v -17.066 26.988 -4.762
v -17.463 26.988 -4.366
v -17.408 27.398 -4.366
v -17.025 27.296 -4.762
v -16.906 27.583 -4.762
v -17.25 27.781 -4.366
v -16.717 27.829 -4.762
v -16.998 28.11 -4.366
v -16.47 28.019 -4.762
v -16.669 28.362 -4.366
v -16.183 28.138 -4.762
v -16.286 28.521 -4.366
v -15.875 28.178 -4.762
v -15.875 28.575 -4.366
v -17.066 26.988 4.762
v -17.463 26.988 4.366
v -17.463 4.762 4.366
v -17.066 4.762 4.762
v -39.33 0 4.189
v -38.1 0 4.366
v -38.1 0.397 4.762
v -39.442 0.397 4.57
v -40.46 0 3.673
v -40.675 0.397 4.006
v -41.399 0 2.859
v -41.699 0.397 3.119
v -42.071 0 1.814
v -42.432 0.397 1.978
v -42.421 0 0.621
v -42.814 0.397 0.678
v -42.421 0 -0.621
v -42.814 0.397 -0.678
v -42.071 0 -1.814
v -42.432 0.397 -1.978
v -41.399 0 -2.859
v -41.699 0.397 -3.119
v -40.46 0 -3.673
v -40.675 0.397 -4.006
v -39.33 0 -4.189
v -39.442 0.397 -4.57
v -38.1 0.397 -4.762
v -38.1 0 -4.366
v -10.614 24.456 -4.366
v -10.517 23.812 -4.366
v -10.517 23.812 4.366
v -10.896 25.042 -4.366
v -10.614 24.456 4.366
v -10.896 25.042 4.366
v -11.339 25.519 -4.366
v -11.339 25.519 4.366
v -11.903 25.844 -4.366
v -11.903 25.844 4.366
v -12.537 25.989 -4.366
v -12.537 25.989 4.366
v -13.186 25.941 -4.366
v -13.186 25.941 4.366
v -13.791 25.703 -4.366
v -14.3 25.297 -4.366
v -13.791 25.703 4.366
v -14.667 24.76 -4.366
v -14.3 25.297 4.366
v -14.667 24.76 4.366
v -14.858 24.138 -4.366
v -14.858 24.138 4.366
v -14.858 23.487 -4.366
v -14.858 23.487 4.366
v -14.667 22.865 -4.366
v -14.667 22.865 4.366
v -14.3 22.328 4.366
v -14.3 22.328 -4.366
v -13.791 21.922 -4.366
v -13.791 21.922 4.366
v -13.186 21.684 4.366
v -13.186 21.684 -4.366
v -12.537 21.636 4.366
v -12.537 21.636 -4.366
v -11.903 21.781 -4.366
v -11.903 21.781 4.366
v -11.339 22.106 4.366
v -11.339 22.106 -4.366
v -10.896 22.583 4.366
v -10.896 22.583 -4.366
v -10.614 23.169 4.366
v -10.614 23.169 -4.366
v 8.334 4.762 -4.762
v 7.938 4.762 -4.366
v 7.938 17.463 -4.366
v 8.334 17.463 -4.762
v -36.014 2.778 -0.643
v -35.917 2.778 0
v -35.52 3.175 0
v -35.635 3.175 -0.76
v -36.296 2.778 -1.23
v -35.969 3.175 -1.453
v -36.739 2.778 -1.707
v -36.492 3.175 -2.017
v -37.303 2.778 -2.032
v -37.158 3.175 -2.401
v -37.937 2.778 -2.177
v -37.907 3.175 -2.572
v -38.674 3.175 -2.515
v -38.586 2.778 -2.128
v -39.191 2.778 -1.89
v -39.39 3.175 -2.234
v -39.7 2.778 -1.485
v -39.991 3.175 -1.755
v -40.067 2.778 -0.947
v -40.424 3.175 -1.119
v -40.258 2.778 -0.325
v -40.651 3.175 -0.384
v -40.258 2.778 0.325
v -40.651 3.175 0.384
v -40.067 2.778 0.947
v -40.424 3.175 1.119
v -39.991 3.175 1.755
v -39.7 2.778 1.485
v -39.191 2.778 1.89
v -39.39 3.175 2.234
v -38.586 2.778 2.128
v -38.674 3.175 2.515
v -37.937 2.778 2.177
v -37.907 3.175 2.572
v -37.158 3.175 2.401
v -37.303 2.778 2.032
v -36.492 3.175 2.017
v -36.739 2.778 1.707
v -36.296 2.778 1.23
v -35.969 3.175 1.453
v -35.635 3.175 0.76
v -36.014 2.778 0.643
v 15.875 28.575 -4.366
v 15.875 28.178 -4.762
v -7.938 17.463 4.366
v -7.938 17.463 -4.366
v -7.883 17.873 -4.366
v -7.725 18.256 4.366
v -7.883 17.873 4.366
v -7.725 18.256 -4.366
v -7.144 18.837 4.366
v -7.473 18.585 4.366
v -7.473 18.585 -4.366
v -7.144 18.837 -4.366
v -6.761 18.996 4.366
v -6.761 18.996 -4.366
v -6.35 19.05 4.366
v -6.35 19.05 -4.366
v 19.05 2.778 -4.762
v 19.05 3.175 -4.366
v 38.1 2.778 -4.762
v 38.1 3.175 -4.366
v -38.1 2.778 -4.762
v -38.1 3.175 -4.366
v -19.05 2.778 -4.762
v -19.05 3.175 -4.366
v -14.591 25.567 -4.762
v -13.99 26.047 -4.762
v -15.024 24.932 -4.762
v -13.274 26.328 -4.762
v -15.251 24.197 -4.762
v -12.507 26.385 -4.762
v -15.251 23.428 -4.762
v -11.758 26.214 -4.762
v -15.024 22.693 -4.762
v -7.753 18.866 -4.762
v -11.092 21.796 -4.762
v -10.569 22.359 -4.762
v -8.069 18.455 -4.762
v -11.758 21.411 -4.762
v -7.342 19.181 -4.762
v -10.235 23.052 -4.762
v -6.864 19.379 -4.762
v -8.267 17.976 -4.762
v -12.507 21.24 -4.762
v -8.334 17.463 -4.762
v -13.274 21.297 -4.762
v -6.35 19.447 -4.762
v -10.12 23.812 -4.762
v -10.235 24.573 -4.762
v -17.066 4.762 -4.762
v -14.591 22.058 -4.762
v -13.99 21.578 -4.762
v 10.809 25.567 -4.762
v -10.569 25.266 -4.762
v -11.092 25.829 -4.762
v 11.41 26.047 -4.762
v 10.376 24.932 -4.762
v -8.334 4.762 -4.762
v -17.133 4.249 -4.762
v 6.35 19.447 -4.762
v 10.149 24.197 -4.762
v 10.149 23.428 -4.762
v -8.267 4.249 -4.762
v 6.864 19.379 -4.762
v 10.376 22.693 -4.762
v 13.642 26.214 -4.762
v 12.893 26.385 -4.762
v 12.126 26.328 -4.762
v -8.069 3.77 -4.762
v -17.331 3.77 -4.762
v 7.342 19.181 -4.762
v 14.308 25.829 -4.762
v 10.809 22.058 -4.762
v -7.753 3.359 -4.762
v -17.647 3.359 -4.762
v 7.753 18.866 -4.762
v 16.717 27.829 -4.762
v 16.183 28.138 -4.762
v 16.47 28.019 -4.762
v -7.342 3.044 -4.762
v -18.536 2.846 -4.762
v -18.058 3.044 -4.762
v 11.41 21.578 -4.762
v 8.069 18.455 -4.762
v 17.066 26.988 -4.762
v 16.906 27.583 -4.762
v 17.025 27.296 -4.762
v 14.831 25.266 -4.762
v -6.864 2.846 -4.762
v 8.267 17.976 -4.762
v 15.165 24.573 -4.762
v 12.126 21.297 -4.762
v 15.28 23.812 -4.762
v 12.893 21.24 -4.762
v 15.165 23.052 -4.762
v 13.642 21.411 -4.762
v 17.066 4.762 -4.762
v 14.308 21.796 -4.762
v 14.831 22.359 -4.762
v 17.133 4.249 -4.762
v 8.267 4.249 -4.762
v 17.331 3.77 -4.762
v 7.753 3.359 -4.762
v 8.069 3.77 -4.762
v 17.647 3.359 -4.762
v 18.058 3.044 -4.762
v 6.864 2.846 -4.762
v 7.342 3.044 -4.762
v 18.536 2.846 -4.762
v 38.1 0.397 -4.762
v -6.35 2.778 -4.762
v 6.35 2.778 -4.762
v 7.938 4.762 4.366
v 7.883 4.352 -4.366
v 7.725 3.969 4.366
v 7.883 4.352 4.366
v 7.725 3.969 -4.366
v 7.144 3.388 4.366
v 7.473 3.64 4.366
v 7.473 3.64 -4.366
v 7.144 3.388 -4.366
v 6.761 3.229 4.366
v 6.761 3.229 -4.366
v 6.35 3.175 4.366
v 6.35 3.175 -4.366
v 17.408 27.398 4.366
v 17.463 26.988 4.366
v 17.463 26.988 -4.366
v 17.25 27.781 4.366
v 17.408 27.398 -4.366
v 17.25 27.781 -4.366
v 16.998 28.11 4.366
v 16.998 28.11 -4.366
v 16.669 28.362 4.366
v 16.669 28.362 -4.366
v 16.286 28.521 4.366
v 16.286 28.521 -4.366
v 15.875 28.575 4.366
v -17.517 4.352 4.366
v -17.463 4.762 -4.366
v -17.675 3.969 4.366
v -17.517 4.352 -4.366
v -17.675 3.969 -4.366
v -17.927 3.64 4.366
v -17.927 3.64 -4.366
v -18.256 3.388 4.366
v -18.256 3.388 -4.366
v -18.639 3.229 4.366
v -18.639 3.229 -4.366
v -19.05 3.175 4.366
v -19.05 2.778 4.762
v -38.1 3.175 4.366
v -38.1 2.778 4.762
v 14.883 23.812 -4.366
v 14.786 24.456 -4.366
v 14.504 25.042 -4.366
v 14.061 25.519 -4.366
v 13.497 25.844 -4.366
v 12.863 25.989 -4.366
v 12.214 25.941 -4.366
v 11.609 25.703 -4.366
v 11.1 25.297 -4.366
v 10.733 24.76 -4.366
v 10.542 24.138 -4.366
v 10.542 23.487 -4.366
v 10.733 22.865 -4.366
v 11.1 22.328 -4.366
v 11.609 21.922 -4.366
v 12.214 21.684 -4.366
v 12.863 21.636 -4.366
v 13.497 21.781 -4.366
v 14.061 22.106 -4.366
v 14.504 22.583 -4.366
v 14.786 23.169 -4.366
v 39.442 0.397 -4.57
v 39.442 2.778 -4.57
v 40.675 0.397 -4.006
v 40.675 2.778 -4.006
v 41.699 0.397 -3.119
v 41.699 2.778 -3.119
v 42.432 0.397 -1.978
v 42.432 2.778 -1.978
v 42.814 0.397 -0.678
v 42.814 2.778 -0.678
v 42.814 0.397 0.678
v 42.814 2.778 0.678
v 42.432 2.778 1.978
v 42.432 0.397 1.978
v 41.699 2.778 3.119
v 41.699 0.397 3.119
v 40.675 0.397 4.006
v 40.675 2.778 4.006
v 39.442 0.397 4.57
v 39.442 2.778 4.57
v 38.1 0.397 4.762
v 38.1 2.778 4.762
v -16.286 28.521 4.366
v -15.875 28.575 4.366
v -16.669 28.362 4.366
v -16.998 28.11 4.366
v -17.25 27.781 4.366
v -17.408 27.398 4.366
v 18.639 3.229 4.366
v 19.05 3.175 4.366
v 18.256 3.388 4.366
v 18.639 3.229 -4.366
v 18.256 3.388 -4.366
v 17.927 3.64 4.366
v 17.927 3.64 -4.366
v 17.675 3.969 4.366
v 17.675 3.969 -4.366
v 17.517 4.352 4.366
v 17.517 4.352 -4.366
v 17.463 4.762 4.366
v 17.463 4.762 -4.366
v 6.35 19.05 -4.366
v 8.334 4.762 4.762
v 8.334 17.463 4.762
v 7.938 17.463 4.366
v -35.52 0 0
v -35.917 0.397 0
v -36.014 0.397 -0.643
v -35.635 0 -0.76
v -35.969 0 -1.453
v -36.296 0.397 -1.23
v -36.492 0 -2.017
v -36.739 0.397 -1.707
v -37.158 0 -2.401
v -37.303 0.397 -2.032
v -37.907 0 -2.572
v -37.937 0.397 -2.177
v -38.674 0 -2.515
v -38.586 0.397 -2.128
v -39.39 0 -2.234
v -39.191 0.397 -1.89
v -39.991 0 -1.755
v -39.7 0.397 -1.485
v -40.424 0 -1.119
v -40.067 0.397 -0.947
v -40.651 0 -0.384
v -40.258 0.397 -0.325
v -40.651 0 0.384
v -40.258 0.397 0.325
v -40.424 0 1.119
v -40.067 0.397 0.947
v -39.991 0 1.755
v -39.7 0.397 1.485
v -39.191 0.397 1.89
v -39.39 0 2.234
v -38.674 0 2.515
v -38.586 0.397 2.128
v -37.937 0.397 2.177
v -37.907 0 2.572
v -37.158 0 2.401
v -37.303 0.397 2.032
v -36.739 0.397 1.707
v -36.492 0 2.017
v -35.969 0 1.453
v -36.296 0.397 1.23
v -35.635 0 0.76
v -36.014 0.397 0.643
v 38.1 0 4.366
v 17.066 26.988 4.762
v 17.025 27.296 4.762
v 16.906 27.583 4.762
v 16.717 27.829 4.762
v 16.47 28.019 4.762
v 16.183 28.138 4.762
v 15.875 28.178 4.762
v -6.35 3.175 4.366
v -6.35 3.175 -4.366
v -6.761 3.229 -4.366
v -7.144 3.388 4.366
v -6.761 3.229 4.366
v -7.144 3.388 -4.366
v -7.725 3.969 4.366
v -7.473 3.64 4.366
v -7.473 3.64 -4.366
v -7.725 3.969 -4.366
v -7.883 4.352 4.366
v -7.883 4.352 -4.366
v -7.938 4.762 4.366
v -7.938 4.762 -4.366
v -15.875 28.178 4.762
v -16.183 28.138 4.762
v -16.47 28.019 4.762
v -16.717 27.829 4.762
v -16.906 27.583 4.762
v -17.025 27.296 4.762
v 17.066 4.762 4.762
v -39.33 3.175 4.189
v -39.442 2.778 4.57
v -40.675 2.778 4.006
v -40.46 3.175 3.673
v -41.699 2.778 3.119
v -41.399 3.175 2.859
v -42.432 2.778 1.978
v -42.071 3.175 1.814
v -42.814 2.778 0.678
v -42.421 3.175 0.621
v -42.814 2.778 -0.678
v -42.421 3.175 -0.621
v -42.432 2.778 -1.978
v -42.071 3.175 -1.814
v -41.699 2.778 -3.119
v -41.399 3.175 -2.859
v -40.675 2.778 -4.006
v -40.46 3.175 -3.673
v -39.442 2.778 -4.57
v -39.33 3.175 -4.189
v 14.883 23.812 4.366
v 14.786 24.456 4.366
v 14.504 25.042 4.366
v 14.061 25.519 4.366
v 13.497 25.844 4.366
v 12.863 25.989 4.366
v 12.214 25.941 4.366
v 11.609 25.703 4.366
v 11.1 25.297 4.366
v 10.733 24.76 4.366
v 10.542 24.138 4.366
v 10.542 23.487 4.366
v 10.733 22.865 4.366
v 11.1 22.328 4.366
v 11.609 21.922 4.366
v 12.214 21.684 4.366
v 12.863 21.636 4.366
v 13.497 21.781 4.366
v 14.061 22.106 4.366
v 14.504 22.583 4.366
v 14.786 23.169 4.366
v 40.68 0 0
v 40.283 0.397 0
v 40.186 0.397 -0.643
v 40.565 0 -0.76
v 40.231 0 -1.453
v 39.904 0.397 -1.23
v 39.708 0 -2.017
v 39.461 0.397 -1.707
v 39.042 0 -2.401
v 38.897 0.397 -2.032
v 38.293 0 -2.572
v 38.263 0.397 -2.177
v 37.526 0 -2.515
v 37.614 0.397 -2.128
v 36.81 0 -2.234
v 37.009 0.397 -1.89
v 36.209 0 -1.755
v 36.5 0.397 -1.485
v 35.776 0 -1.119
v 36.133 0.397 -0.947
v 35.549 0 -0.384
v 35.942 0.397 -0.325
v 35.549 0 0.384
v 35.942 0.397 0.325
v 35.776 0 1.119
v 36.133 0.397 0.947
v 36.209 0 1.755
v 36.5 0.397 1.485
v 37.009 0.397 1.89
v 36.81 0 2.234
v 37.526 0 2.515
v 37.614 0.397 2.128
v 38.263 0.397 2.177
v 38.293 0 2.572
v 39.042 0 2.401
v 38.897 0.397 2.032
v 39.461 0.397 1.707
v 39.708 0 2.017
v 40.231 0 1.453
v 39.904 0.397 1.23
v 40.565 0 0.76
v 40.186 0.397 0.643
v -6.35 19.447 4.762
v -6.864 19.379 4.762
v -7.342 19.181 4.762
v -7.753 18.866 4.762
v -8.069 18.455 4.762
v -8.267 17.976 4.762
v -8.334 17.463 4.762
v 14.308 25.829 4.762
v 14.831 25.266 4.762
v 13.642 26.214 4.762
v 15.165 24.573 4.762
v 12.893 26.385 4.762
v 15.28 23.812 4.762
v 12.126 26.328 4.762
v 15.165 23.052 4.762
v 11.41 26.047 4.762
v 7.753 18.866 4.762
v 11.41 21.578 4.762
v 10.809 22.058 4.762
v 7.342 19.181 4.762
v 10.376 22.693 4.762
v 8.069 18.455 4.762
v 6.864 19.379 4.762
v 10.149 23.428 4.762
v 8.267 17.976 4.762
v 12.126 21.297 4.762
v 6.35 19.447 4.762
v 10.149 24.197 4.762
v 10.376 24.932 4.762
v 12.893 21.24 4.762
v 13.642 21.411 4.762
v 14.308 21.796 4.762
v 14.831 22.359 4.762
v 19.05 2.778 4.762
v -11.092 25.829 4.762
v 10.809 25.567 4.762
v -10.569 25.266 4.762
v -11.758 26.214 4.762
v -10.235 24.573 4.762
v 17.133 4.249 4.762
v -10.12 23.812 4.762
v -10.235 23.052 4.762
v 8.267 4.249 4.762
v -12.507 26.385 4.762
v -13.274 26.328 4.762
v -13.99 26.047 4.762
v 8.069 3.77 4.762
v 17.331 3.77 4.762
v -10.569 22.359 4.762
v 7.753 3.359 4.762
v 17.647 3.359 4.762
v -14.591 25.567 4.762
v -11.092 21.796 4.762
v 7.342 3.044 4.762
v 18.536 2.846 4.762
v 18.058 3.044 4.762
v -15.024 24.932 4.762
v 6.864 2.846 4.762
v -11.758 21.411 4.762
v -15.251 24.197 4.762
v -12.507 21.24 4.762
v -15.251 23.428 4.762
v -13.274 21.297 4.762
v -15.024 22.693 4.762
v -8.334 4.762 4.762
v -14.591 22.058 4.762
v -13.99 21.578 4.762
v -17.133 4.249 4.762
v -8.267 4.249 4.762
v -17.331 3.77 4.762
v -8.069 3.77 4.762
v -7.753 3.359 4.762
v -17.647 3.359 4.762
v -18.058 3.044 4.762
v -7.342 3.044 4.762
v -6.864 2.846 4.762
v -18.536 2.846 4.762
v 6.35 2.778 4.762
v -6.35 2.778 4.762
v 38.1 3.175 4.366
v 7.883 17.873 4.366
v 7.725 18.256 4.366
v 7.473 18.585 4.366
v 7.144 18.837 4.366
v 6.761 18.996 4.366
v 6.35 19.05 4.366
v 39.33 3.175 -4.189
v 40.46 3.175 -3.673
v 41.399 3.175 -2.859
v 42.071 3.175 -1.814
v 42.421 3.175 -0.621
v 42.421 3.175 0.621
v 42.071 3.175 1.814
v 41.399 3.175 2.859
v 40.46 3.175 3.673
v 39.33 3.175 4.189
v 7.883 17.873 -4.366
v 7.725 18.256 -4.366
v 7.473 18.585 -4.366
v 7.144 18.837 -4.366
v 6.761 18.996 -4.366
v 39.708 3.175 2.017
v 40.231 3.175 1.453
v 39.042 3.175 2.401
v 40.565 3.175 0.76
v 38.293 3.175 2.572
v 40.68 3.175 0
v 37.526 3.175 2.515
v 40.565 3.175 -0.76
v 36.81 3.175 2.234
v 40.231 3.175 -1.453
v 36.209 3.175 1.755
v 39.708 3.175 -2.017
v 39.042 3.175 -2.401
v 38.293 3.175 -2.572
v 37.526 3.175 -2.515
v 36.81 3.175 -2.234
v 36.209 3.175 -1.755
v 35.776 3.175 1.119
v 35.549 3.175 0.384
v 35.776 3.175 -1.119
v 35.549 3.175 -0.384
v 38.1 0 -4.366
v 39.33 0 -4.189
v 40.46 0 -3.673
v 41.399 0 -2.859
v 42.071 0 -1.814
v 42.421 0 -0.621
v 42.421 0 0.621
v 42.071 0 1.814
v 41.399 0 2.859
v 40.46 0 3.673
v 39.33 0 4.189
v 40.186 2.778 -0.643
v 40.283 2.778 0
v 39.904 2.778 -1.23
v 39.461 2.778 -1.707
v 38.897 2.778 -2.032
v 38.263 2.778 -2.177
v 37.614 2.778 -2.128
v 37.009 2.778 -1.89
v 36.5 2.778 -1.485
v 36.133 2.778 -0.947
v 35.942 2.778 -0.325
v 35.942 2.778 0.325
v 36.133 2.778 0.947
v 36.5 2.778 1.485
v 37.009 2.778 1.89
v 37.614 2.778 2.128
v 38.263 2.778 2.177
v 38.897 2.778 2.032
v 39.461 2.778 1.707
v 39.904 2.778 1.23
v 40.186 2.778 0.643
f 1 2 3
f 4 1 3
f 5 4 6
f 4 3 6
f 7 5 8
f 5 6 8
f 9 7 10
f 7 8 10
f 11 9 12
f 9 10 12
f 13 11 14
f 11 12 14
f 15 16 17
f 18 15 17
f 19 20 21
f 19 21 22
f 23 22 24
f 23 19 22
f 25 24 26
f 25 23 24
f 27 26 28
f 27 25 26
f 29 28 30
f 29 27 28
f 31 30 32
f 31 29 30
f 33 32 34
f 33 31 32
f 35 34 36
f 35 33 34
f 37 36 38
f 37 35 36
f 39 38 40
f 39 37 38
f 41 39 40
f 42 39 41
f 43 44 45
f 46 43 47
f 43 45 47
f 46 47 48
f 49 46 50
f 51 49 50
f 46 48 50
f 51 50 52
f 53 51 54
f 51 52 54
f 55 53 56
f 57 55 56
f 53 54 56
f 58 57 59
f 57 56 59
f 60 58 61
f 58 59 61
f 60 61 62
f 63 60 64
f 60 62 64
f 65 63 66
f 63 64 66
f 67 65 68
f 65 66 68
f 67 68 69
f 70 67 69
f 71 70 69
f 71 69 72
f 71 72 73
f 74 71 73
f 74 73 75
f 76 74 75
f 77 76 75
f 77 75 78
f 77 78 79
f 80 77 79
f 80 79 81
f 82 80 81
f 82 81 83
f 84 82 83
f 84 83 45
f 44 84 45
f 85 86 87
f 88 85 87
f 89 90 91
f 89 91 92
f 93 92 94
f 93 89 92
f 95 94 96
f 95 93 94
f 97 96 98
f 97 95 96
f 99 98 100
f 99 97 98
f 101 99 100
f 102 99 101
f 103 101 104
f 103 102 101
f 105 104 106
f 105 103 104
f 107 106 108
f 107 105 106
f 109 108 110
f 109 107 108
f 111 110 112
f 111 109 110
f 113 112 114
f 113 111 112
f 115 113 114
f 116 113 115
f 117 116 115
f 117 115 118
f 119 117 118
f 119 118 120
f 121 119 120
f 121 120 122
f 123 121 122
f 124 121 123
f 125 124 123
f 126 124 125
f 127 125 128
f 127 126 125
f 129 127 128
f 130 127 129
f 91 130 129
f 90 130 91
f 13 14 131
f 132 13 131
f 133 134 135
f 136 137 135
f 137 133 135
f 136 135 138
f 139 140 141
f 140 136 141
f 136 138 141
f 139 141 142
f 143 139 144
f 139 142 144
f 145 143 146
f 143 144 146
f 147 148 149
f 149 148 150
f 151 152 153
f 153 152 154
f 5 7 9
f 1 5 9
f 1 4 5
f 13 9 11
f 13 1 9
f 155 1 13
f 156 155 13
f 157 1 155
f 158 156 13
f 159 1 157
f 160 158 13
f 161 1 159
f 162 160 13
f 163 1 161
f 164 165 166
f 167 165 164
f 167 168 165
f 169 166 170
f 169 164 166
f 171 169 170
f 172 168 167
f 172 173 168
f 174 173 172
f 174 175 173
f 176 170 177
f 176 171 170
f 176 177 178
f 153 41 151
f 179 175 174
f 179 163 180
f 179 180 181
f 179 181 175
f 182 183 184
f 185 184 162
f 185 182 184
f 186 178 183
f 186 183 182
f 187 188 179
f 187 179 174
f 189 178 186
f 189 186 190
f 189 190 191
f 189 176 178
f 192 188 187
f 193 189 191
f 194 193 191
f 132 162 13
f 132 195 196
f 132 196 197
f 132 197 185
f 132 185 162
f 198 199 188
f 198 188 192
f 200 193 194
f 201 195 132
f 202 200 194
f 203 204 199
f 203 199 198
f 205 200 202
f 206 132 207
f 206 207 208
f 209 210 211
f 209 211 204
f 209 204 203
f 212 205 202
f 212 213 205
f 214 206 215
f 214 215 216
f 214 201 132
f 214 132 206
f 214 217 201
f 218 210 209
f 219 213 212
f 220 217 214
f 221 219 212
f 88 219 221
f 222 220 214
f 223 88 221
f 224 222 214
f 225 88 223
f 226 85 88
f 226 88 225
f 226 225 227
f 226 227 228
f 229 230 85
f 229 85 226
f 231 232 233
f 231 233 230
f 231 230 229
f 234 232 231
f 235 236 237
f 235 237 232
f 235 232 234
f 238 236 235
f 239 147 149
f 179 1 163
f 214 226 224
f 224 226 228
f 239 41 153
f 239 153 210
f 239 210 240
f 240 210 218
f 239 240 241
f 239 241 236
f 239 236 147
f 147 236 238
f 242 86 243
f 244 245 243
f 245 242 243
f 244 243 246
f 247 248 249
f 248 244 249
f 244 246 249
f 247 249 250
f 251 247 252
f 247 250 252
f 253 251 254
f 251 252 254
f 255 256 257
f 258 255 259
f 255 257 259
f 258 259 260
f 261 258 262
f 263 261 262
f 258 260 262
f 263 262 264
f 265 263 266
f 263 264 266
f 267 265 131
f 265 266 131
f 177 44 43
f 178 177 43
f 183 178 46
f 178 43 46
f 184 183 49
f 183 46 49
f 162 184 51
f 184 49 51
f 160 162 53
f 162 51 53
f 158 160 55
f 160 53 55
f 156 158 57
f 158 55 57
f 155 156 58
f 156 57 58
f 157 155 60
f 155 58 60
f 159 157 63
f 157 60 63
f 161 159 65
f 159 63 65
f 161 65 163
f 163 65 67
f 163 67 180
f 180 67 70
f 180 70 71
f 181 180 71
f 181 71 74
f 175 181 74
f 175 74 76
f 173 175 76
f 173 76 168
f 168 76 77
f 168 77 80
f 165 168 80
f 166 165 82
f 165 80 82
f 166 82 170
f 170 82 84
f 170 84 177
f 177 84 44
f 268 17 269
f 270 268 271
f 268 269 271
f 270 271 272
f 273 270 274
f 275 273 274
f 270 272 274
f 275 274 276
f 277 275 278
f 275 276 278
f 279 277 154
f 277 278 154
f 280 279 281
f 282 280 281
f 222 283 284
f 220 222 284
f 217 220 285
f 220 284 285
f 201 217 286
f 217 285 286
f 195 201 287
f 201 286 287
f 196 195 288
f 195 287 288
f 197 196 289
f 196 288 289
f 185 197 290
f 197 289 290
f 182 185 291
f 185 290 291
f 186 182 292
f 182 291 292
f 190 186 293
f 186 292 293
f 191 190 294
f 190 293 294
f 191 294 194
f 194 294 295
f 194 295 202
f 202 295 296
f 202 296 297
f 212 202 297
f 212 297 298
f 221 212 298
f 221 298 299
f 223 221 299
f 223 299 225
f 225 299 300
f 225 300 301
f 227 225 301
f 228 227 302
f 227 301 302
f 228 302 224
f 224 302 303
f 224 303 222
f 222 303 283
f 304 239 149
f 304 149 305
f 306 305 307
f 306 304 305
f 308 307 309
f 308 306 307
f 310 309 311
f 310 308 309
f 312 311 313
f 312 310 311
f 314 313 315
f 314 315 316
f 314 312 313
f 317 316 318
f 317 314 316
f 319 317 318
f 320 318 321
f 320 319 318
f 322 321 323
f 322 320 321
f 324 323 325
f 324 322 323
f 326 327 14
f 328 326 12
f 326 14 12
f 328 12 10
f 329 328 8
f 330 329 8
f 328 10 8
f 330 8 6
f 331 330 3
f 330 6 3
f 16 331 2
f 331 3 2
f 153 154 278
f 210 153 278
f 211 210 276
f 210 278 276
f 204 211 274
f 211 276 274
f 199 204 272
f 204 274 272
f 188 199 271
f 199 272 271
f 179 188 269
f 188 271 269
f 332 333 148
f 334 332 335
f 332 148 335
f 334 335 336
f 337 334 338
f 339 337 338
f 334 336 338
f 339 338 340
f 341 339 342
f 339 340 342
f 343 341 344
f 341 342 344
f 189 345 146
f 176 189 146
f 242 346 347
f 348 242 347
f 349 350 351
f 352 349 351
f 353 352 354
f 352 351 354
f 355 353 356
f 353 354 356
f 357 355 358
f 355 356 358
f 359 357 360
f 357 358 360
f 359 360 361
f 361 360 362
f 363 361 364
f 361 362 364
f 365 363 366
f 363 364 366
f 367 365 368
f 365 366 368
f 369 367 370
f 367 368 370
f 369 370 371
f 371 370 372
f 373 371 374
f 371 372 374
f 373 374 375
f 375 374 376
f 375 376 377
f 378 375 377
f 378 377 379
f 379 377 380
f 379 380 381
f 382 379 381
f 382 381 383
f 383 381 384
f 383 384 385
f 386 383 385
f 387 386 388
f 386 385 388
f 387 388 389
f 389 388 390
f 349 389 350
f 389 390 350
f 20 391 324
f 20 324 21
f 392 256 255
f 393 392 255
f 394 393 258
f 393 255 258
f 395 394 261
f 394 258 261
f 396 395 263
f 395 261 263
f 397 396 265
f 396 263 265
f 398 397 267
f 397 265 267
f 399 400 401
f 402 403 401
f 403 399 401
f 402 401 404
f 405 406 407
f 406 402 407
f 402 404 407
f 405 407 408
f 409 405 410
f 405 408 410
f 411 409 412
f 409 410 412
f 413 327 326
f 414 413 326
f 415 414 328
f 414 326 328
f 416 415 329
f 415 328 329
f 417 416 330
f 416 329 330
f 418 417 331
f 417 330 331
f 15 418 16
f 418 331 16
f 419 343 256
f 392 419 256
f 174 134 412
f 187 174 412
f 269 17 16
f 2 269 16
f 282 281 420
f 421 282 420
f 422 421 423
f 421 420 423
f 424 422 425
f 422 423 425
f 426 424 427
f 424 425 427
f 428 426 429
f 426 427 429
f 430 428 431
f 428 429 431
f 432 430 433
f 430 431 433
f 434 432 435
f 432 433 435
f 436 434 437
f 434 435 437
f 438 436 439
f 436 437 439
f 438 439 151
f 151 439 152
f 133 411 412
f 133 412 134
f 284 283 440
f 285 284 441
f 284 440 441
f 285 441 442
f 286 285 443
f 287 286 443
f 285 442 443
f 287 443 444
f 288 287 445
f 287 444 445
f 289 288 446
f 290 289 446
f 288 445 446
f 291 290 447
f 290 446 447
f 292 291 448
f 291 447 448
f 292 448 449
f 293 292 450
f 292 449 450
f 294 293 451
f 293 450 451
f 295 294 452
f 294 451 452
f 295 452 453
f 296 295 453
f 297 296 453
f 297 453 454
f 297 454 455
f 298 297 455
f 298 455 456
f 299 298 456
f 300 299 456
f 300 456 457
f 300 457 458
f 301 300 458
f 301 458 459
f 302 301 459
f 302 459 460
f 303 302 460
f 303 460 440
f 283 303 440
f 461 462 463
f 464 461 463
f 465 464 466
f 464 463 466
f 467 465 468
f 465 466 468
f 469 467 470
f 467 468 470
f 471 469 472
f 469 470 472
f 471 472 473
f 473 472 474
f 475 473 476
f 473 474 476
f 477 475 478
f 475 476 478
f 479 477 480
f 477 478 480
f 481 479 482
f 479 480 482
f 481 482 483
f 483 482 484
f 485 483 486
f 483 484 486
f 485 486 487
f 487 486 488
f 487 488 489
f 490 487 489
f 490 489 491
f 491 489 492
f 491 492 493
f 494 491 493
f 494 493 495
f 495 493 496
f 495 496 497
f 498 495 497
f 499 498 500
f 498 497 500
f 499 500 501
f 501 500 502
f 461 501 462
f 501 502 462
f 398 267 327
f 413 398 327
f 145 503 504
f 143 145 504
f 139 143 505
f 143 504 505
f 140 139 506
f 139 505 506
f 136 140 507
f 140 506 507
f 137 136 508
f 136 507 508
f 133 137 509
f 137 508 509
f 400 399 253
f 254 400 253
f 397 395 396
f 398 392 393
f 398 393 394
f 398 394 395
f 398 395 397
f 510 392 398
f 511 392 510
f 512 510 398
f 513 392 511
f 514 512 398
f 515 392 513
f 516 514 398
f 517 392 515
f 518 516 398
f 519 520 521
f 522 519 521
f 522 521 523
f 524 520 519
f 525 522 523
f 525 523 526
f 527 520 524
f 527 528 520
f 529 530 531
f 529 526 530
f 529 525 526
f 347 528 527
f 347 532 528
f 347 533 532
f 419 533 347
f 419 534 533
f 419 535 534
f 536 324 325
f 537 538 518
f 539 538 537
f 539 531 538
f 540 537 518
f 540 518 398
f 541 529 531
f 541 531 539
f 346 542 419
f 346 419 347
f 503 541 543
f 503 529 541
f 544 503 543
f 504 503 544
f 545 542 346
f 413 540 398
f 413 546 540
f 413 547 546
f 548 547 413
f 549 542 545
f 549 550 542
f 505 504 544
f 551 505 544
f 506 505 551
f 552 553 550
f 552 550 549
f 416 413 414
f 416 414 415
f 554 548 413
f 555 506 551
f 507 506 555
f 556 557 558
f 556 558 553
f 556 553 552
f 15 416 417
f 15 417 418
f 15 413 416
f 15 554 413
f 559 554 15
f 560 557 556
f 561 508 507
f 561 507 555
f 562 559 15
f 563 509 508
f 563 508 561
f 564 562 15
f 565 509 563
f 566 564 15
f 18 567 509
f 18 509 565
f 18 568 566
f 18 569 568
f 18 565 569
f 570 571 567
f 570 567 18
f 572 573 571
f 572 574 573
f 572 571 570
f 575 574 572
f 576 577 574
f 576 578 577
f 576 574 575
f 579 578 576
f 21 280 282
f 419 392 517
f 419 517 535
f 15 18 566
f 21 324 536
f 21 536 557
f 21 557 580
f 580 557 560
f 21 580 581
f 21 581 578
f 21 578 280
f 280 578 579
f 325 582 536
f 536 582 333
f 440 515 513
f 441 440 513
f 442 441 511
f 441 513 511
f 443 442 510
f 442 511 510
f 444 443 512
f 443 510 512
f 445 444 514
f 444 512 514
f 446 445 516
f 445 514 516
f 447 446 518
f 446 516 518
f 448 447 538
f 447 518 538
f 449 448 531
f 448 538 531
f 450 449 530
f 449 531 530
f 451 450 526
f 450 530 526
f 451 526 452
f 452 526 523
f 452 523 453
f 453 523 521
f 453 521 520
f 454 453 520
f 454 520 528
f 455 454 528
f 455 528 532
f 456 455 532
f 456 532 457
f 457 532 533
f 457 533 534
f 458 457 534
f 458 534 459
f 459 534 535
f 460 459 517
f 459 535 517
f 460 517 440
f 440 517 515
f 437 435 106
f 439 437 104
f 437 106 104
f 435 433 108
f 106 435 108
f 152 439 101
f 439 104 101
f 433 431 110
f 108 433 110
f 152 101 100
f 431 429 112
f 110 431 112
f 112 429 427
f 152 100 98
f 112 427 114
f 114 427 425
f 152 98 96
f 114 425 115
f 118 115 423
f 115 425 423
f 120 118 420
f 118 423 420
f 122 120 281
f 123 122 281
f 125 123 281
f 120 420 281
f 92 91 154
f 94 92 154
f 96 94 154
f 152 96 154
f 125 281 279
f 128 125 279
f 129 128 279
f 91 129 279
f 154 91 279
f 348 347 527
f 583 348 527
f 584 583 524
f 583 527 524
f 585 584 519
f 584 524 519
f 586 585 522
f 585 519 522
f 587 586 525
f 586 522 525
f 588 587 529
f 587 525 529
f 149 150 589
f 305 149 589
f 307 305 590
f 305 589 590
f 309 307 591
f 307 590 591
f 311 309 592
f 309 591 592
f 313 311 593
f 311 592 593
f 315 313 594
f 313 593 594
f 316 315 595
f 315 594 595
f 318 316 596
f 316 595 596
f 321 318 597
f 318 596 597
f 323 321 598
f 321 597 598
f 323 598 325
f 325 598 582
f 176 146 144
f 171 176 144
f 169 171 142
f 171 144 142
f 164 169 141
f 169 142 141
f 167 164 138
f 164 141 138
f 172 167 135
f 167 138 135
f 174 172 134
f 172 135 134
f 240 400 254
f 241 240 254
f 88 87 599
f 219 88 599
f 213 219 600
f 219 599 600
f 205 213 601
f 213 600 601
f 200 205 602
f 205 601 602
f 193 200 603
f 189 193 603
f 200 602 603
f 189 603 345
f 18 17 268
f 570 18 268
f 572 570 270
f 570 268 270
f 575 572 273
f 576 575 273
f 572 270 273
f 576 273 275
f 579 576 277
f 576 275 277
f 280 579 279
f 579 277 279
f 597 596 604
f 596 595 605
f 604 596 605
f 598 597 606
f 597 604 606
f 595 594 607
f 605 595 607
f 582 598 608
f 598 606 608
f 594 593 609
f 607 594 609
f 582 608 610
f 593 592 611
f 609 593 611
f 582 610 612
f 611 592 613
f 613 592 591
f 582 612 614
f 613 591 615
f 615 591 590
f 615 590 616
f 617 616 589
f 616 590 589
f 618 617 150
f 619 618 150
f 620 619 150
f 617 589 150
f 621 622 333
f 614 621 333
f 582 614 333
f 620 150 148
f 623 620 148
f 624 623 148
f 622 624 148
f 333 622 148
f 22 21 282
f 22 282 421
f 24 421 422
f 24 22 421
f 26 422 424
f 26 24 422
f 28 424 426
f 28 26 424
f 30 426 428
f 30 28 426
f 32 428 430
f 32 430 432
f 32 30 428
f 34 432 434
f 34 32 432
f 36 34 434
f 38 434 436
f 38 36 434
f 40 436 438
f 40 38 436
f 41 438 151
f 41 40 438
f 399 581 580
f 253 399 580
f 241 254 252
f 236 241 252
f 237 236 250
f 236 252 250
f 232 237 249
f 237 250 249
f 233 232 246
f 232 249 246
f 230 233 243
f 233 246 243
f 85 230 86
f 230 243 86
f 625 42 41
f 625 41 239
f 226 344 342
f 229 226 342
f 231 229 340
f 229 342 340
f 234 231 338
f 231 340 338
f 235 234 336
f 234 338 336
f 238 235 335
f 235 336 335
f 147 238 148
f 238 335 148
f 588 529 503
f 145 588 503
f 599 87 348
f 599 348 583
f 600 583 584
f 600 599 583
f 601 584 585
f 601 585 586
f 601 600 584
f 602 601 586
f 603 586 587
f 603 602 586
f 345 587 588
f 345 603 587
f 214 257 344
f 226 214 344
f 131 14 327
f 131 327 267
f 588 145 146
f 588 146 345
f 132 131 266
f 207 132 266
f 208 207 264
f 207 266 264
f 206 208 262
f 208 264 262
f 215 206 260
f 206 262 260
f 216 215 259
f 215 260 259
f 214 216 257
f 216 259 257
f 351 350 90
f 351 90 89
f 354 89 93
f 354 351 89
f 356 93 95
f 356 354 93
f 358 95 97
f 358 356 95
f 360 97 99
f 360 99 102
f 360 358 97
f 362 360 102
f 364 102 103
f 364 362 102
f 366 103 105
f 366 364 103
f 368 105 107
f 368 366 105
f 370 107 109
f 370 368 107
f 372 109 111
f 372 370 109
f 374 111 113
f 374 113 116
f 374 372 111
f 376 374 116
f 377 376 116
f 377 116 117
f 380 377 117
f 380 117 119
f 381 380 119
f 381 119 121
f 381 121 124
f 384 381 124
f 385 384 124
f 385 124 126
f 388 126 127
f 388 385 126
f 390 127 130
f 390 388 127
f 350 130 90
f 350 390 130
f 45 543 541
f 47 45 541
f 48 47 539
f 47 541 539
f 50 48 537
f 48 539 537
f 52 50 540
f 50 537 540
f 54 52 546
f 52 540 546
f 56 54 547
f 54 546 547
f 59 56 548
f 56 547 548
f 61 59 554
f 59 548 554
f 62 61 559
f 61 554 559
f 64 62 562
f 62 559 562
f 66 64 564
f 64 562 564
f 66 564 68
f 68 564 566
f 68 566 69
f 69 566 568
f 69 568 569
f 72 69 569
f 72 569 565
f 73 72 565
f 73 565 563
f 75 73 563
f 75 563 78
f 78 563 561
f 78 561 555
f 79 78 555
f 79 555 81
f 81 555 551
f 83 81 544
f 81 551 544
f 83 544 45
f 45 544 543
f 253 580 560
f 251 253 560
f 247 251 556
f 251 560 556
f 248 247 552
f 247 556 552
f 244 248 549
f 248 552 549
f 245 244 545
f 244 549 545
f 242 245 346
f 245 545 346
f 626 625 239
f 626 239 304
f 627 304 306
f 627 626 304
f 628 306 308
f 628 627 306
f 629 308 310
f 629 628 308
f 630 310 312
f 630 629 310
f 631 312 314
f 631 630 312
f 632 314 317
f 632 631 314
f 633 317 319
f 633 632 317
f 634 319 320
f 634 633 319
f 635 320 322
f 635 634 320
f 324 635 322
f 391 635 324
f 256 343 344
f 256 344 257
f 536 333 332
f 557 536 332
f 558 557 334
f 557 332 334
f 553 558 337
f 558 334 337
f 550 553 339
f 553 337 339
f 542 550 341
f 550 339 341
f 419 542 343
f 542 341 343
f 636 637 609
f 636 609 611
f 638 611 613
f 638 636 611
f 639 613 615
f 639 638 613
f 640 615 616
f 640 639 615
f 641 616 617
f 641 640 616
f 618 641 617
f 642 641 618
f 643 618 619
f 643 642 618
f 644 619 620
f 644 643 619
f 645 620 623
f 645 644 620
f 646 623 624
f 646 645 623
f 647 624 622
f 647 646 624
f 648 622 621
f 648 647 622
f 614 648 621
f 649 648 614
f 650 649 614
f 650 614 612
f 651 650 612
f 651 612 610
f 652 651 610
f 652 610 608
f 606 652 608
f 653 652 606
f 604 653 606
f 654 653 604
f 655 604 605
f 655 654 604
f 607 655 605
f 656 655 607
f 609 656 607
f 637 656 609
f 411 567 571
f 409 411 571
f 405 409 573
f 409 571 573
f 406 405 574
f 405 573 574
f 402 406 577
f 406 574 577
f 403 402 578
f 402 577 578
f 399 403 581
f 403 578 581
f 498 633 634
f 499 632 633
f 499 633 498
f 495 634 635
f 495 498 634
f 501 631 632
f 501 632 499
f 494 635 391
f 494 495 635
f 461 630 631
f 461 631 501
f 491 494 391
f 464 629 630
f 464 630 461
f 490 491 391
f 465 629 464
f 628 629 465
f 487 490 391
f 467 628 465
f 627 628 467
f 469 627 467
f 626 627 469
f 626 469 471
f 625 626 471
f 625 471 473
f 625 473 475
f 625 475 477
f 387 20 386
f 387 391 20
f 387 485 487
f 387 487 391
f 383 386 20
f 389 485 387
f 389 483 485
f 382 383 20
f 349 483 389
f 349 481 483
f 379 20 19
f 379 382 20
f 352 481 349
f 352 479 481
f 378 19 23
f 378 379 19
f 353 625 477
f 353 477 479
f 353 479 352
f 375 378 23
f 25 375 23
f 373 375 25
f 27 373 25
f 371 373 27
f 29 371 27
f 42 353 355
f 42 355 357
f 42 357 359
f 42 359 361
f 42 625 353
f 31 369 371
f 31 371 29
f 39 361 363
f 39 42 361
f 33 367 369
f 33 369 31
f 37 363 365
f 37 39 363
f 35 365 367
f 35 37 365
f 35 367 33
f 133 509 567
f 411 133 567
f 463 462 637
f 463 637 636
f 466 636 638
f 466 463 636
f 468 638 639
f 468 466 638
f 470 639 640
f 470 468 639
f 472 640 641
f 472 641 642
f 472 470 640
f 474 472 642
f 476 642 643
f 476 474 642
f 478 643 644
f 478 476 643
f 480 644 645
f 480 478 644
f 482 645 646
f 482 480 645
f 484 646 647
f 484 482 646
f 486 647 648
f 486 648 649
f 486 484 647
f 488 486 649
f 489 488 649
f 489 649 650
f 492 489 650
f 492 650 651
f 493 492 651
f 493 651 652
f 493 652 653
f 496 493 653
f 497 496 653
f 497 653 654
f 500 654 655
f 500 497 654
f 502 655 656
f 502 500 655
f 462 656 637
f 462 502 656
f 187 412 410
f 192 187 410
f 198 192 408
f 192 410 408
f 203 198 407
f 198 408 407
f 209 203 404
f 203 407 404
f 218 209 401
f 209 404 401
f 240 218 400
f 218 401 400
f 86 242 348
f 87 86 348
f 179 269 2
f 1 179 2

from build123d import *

# Parameters (mm, degrees)
SKETCH2_R               = 2.1828125
BOSS_EXTRUDE1_DEPTH     = 3.175
SKETCH3_W               = 36.843225838
SKETCH3_H               = 9.525
BOSS_EXTRUDE2_DEPTH     = 25.4
SKETCH4_R               = 2.1828125
SKETCH4_W               = 0.959112919
SKETCH4_H               = 25.4
SKETCH4_W_2             = 15.875
SKETCH4_H_2             = 15.875
CUT_EXTRUDE1_DEPTH      = 1
CUT_EXTRUDE1_DEPTH_BACK = 10.525
FILLET1_R               = 1.5875
CHAMFER1_SIZE           = 0.396875


with BuildPart() as part:
    # Sketch2 → Boss-Extrude1 (new body)
    with BuildSketch(Plane(origin=(0, 0, 0), x_dir=(1, 0, 0), z_dir=(0, 1, 0))):
        with BuildLine():
            Line((-38.1, 4.7625), (38.1, 4.7625))
            ThreePointArc((38.1, 4.7625), (42.8625, 0), (38.1, -4.7625))
            Line((38.1, -4.7625), (-38.1, -4.7625))
            ThreePointArc((-38.1, -4.7625), (-42.8625, 0), (-38.1, 4.7625))
        make_face()
        with Locations((-38.1, 0)):
            Circle(SKETCH2_R, mode=Mode.SUBTRACT)
        with Locations((38.1, 0)):
            Circle(SKETCH2_R, mode=Mode.SUBTRACT)
    extrude(amount=BOSS_EXTRUDE1_DEPTH)

    # Sketch3 → Boss-Extrude2 (add)
    with BuildSketch(Plane(origin=(0, 3.175, 0), x_dir=(1, 0, 0), z_dir=(0, 1, 0))):
        Rectangle(SKETCH3_W, SKETCH3_H)
    extrude(amount=BOSS_EXTRUDE2_DEPTH)

    # Sketch4 → Cut-Extrude1 (cut, two sides)
    with BuildSketch(Plane.XY.offset(4.7625)) as cut_extrude1_sk:
        with Locations((-12.7, 23.8125)):
            Circle(SKETCH4_R)
        with Locations((12.7, 23.8125)):
            Circle(SKETCH4_R)
        with Locations((-17.94205646, 15.875)):
            Rectangle(SKETCH4_W, SKETCH4_H)
        with Locations((17.94205646, 15.875)):
            Rectangle(SKETCH4_W, SKETCH4_H)
        with Locations((0, 11.1125)):
            Rectangle(SKETCH4_W_2, SKETCH4_H_2)
    extrude(amount=CUT_EXTRUDE1_DEPTH, mode=Mode.SUBTRACT)
    extrude(cut_extrude1_sk.sketch, amount=-CUT_EXTRUDE1_DEPTH_BACK, mode=Mode.SUBTRACT)

    # Fillet1
    fillet1_edges = [part.edges().sort_by_distance(p)[0] for p in [
        (-17.4625, 3.175, 0),
        (-17.4625, 28.575, 0),
        (17.4625, 28.575, 0),
        (17.4625, 3.175, 0),
        (-7.9375, 3.175, 0),
        (-7.9375, 19.05, 0),
        (7.9375, 19.05, 0),
        (7.9375, 3.175, 0),
    ]]
    fillet(fillet1_edges, radius=FILLET1_R)

    # Chamfer1
    chamfer1_edges = [part.edges().sort_by_distance(p)[0] for p in [
        (0, 28.575, -4.7625),
        (0, 28.575, 4.7625),
        (0, 3.175, 4.7625),
        (-7.9375, 11.1125, 4.7625),
        (0, 19.05, 4.7625),
        (7.9375, 11.1125, 4.7625),
        (-17.4625, 15.875, 4.7625),
        (28.575, 3.175, 4.7625),
        (17.4625, 15.875, 4.7625),
        (16.997532015, 28.110032015, 4.7625),
        (-16.997532015, 28.110032015, 4.7625),
        (-17.4625, 15.875, -4.7625),
        (0, 19.05, -4.7625),
        (-7.9375, 11.1125, -4.7625),
        (0, 3.175, -4.7625),
        (7.9375, 11.1125, -4.7625),
        (-28.575, 3.175, -4.7625),
        (17.4625, 15.875, -4.7625),
        (16.997532015, 28.110032015, -4.7625),
        (-16.997532015, 28.110032015, -4.7625),
        (-40.2828125, 0, 0),
        (-17.927467985, 3.639967985, 4.7625),
        (-40.2828125, 3.175, 0),
        (-17.927467985, 3.639967985, -4.7625),
        (17.927467985, 3.639967985, 4.7625),
        (17.927467985, 3.639967985, -4.7625),
        (-7.472532015, 18.585032015, 4.7625),
        (42.8625, 3.175, 0),
        (-7.472532015, 18.585032015, -4.7625),
        (7.472532015, 18.585032015, 4.7625),
        (7.472532015, 18.585032015, -4.7625),
        (7.472532015, 3.639967985, 4.7625),
        (7.472532015, 3.639967985, -4.7625),
        (-7.472532015, 3.639967985, 4.7625),
        (-7.472532015, 3.639967985, -4.7625),
        (35.9171875, 0, 0),
        (35.9171875, 3.175, 0),
        (28.575, 3.175, -4.7625),
        (10.5171875, 23.8125, -4.7625),
        (10.5171875, 23.8125, 4.7625),
        (-42.8625, 3.175, 0),
        (0, 0, -4.7625),
        (42.8625, 0, 0),
        (0, 0, 4.7625),
        (-42.8625, 0, 0),
        (-14.8828125, 23.8125, -4.7625),
        (-14.8828125, 23.8125, 4.7625),
        (-28.575, 3.175, 4.7625),
    ]]
    chamfer(chamfer1_edges, length=CHAMFER1_SIZE)


solid = part.part
